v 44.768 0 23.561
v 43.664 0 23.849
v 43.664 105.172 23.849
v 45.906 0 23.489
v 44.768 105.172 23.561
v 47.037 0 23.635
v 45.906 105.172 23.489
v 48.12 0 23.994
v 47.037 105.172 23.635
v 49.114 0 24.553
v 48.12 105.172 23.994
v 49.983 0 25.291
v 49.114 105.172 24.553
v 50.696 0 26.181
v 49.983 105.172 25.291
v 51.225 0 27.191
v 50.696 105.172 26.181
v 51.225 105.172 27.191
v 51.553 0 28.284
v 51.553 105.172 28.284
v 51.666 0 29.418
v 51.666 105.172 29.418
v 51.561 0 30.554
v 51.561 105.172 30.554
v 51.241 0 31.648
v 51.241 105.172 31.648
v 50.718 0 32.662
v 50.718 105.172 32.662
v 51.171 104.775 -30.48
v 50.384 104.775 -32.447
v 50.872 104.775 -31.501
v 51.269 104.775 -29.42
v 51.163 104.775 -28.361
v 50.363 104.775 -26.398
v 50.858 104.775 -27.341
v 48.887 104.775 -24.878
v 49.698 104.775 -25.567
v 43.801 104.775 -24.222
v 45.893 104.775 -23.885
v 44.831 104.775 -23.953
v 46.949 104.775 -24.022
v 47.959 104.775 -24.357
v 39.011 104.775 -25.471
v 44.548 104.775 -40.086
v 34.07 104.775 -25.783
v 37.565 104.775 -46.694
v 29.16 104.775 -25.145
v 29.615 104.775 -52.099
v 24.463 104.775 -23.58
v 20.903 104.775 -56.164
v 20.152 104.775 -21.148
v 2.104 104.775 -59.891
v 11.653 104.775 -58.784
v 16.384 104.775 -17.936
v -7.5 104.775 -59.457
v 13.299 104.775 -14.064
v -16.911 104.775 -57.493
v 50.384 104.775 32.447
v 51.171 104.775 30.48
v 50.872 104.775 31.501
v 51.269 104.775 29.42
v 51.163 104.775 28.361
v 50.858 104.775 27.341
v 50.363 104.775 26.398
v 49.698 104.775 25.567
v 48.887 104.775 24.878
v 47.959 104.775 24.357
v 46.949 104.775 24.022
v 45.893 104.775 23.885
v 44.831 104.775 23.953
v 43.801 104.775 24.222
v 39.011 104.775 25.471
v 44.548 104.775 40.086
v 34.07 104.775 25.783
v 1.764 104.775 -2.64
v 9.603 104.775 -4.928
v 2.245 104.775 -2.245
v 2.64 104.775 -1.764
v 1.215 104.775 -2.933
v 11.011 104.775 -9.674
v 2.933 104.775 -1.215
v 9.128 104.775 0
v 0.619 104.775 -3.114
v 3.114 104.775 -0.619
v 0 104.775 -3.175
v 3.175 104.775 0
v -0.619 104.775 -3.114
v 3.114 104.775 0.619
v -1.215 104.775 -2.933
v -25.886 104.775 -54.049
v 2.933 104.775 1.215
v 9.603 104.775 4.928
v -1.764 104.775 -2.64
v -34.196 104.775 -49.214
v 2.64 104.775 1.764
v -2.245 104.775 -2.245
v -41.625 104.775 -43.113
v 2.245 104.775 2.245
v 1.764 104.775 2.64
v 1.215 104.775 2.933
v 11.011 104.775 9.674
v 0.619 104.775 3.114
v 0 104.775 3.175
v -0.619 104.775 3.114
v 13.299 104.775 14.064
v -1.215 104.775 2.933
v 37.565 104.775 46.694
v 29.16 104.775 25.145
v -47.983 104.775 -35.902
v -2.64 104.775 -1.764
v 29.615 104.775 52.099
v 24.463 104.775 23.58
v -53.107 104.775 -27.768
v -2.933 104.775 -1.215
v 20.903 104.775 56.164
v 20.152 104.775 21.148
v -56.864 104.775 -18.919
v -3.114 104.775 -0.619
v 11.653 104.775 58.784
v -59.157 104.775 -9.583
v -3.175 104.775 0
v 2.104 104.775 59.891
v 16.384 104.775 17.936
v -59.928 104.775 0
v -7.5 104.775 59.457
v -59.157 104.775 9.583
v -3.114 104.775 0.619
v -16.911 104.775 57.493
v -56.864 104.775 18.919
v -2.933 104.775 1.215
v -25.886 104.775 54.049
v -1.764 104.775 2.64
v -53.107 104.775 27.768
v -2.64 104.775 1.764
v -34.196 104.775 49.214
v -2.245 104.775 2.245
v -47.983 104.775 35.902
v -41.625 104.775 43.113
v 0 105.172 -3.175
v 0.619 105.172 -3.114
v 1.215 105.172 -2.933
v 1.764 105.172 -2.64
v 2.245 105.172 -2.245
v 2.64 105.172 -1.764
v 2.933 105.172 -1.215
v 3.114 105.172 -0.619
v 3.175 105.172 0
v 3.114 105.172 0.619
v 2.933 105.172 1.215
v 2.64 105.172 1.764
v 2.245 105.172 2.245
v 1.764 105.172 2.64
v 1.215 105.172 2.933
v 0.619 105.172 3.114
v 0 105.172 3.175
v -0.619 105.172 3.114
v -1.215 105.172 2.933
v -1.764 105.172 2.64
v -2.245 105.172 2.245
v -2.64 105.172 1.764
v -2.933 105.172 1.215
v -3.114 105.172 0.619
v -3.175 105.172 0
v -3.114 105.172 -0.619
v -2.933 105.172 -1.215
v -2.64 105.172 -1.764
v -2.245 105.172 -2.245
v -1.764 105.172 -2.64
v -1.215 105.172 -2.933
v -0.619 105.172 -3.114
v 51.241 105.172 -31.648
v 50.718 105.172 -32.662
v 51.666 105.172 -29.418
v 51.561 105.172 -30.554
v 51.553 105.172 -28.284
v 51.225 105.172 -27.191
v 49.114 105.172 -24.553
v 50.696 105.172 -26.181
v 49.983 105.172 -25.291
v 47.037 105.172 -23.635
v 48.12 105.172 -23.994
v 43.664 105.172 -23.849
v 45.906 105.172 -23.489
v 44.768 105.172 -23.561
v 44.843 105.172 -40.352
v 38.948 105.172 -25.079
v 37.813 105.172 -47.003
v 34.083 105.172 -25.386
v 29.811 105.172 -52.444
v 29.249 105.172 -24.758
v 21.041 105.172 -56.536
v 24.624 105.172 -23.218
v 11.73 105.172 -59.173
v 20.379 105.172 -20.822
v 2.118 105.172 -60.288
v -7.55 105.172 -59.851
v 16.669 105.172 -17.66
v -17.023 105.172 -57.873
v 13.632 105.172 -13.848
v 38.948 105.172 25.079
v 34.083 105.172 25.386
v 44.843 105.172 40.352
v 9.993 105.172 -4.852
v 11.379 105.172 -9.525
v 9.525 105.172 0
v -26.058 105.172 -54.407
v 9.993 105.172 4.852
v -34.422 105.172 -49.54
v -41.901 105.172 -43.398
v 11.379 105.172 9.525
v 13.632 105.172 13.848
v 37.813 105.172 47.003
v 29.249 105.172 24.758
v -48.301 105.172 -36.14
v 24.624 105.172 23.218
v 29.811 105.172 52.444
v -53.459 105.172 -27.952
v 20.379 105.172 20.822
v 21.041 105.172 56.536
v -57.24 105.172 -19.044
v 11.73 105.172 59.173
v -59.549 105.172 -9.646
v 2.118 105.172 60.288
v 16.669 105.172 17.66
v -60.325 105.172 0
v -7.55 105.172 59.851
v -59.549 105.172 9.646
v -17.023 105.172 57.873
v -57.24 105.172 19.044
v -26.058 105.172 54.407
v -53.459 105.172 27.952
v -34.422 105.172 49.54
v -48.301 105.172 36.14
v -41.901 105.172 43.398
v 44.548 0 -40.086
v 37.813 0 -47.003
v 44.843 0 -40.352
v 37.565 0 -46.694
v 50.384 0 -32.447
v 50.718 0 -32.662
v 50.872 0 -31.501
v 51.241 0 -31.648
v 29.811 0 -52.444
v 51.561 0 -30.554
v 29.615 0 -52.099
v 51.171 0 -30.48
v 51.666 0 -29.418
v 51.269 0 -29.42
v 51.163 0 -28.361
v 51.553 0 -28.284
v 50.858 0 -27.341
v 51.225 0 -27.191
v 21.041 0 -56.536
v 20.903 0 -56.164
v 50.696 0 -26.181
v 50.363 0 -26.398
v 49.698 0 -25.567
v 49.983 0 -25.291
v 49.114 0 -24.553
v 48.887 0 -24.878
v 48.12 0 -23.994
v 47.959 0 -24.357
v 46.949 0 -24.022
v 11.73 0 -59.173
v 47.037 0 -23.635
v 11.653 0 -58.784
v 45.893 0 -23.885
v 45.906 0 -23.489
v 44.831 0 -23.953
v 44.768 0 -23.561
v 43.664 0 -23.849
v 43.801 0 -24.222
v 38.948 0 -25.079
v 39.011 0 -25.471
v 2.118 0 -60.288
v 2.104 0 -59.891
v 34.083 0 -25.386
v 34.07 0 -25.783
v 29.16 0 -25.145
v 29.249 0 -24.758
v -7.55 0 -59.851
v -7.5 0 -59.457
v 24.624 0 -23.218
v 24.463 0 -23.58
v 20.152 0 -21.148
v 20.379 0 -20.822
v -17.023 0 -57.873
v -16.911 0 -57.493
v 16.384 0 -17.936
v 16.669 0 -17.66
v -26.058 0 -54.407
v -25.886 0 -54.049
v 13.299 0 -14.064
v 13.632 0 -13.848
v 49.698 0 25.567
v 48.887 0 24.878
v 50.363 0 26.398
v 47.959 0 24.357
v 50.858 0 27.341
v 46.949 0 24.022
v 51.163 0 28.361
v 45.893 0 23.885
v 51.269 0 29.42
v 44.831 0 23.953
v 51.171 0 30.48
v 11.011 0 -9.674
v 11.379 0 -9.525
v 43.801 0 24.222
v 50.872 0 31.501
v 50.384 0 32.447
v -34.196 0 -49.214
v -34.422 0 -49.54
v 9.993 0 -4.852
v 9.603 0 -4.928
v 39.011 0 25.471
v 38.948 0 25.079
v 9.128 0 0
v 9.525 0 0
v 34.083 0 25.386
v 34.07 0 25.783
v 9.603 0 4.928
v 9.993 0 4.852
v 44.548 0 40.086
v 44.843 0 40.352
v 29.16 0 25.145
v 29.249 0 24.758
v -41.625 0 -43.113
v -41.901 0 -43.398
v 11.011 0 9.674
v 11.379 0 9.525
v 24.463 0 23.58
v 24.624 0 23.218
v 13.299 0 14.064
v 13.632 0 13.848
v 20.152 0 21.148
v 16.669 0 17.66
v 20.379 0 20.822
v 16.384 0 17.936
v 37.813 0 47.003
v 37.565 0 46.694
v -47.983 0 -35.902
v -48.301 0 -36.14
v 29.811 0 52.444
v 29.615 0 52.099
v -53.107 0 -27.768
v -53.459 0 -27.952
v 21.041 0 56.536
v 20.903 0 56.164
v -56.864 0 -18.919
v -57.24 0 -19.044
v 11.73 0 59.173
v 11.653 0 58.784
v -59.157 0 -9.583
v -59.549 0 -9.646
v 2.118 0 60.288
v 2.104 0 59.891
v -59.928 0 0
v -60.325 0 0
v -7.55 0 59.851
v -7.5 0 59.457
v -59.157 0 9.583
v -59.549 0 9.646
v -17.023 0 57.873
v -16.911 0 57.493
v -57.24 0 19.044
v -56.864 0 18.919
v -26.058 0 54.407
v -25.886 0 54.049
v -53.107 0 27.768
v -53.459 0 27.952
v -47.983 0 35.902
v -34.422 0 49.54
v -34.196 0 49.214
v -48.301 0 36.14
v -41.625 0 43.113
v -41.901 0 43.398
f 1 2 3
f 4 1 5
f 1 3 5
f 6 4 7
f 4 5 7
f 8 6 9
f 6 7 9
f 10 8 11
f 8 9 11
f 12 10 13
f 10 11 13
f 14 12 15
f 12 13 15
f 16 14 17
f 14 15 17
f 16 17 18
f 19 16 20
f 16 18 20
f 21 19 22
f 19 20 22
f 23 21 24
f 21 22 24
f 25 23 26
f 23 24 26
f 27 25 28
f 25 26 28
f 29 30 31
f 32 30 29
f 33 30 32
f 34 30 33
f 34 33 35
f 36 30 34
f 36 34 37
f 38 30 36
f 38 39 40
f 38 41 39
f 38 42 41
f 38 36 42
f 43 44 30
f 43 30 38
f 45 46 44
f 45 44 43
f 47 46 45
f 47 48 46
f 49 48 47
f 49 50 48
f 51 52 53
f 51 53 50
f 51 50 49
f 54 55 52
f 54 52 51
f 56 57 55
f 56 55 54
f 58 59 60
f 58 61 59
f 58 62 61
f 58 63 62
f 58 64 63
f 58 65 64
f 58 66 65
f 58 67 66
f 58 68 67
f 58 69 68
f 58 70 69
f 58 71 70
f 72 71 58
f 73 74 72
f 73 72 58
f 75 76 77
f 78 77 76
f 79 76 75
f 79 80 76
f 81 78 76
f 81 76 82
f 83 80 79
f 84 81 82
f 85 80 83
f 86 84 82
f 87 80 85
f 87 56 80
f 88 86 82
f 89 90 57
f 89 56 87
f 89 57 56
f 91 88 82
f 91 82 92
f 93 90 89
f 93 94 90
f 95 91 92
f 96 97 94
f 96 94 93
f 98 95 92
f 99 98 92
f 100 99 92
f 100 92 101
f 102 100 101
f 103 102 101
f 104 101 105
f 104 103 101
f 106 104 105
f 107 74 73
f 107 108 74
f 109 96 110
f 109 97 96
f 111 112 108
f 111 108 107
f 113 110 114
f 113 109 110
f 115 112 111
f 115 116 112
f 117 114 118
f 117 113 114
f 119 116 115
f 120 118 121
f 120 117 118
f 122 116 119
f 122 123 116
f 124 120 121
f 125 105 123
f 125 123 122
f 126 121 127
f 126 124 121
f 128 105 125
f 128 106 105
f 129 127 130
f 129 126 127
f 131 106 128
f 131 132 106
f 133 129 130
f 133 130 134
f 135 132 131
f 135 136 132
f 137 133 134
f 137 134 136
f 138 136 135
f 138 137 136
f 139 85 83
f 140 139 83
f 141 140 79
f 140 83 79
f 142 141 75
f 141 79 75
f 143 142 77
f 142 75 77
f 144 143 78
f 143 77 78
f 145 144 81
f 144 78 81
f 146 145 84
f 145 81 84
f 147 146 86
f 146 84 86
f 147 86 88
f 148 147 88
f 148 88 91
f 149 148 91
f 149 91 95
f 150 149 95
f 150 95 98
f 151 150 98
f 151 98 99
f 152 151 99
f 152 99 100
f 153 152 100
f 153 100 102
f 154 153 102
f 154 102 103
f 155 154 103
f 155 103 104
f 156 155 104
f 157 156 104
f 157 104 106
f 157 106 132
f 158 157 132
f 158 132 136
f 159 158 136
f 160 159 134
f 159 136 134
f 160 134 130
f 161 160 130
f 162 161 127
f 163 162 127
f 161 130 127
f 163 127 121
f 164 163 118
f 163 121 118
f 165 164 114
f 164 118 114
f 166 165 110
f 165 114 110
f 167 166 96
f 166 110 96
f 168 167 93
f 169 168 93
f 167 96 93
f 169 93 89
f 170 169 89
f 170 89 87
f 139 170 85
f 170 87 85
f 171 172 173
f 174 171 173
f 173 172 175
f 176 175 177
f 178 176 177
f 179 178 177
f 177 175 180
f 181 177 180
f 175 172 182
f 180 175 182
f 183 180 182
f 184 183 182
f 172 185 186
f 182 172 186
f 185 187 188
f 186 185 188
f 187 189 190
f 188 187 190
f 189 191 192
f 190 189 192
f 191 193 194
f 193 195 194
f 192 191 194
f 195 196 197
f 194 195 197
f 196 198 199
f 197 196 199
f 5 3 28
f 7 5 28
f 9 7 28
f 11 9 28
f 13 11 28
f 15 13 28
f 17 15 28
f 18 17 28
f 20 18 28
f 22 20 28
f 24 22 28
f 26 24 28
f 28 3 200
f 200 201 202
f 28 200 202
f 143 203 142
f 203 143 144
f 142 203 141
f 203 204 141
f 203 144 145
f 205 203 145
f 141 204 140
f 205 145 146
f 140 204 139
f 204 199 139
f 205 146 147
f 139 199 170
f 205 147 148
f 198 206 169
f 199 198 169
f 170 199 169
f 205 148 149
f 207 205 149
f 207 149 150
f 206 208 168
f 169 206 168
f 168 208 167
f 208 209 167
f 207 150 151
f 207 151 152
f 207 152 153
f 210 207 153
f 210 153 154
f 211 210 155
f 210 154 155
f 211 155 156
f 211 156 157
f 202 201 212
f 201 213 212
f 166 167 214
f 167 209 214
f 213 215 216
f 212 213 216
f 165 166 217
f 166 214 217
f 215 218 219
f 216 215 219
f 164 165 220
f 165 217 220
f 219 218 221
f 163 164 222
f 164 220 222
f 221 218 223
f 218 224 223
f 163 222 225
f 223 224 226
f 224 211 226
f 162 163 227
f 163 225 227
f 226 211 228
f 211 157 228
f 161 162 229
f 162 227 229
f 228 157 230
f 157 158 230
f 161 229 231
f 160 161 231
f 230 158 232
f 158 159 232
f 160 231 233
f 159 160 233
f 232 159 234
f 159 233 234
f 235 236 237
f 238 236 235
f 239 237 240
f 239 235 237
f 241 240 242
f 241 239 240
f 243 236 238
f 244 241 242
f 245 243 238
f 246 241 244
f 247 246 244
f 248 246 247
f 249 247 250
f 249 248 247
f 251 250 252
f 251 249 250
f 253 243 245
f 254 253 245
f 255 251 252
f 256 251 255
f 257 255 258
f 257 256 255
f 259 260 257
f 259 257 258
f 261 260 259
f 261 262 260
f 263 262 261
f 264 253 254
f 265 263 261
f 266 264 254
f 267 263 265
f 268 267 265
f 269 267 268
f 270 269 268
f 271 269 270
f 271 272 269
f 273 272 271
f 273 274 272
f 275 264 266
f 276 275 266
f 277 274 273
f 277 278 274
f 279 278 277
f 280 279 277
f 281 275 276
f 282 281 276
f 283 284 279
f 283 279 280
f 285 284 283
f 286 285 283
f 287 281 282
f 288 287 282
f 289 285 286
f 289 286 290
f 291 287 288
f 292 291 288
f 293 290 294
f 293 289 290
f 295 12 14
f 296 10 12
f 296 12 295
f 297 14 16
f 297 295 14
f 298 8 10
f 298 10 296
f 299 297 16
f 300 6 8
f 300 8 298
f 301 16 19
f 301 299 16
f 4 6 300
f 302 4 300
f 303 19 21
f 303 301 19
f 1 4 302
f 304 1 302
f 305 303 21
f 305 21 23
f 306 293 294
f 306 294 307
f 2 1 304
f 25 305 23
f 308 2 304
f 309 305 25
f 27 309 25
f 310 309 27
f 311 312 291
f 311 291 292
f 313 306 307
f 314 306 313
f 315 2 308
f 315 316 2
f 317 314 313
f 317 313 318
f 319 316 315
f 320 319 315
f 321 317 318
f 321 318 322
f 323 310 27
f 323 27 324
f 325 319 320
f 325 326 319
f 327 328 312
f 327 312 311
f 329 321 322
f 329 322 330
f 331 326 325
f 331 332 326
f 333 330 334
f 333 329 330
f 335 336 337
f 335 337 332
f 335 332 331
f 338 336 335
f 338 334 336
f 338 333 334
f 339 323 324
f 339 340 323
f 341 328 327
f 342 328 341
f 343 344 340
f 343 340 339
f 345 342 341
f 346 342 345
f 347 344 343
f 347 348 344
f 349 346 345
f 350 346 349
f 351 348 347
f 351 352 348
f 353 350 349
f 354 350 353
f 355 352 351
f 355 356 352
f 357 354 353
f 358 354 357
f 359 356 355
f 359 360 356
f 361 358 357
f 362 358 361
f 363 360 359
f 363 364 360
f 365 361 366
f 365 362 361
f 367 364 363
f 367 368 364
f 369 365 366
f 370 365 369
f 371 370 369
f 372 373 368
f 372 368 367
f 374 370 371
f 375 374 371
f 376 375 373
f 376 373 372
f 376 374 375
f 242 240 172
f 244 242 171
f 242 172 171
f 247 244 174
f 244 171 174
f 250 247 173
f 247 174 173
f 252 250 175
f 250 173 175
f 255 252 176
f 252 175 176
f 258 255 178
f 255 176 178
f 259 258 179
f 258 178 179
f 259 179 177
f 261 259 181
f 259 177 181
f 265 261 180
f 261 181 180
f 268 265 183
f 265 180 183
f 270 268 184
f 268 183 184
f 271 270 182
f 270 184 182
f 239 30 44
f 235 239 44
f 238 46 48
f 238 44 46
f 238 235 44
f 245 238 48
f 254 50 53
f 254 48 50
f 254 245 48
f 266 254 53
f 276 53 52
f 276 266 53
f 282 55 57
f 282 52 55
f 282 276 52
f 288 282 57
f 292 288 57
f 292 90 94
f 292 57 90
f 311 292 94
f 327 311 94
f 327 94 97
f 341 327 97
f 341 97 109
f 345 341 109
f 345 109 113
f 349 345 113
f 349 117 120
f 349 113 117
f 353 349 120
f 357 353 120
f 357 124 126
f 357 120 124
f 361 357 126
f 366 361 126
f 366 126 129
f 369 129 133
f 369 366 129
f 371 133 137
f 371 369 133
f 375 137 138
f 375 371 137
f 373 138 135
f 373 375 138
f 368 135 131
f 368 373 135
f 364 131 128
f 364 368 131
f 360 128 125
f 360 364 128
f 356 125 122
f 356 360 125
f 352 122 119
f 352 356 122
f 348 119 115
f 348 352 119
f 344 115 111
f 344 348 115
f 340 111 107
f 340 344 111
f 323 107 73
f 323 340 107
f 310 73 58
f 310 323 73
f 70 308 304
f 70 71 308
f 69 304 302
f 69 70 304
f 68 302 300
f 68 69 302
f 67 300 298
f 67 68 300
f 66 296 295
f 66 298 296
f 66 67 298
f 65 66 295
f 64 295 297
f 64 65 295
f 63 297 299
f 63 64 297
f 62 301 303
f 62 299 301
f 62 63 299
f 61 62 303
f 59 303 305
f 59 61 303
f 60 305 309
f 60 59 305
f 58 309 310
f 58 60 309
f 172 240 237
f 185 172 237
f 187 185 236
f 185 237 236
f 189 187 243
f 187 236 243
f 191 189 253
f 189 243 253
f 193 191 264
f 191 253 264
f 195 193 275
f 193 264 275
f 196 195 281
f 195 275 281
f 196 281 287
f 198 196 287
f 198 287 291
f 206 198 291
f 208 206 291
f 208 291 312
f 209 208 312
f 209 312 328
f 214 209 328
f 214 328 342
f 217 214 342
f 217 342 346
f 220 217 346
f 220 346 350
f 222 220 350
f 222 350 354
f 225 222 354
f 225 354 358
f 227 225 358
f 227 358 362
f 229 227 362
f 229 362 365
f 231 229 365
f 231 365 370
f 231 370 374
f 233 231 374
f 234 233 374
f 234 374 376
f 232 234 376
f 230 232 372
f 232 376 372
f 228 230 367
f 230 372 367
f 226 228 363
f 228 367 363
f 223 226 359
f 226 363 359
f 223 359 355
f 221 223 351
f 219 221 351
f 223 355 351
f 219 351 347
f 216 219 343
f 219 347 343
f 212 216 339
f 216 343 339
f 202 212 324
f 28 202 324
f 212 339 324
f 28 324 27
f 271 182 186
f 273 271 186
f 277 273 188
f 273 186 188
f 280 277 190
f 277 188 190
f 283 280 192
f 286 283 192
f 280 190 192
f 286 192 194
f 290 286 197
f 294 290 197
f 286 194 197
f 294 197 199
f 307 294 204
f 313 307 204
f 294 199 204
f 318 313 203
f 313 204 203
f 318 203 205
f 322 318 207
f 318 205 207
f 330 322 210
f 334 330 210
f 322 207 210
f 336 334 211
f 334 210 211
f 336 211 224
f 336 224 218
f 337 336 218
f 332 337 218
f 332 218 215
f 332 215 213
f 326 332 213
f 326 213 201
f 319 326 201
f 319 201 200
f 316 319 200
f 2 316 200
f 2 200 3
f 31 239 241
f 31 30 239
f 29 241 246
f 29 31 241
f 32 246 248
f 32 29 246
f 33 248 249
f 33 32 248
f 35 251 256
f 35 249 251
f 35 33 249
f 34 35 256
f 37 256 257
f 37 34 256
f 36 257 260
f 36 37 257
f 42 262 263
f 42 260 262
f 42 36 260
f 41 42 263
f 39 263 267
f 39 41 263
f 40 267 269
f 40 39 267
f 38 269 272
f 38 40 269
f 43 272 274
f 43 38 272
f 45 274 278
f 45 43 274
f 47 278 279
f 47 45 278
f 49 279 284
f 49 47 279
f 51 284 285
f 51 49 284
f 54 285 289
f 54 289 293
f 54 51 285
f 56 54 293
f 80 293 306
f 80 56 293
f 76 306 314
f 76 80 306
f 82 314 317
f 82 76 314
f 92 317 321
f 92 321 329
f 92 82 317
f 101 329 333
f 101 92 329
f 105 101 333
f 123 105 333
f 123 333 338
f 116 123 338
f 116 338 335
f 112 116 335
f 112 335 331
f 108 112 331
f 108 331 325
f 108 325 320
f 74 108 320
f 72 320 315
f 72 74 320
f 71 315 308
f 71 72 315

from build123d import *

# Parameters (mm, degrees)
CUT_EXTRUDE1_DEPTH = 136.422799192
SHELL1_T           = -0.396875
SKETCH3_R          = 3.175
CUT_EXTRUDE2_DEPTH = 136.114809977


with BuildPart() as part:
    # Sketch1 → Revolve1 (revolve)
    with BuildSketch(Plane.XY, mode=Mode.PRIVATE) as revolve1_sk:
        Polygon((0, 105.171875), (60.325, 105.171875), (60.325, 0), (59.928125, 0), (0, 0), align=None)
    revolve(revolve1_sk.sketch.rotate(Axis((0, 0, 0), (0, 1, 0)), 90), axis=Axis((0, 0, 0), (0, 1, 0)))

    # Sketch2 → Cut-Extrude1 (cut, through all)
    with BuildSketch(Plane(origin=(0, 105.171875, 0), x_dir=(1, 0, 0), z_dir=(0, 1, 0))):
        with BuildLine():
            ThreePointArc((43.664470656, 23.849143646), (9.525, 0), (43.664470656, -23.849143646))
            ThreePointArc((43.664470656, -23.849143646), (50.360604205, -25.718912301), (50.717833444, -32.662011508))
            ThreePointArc((50.717833444, -32.662011508), (60.325, 0), (50.717833444, 32.662011508))
            ThreePointArc((50.717833444, 32.662011508), (50.360604205, 25.718912301), (43.664470656, 23.849143646))
        make_face()
    extrude(amount=-CUT_EXTRUDE1_DEPTH, mode=Mode.SUBTRACT)

    # Shell1
    shell1_openings = [part.faces().sort_by_distance(p)[0] for p in [
        (-8.714175157, 0, 0),
    ]]
    offset(amount=SHELL1_T, openings=shell1_openings, kind=Kind.INTERSECTION)

    # Sketch3 → Cut-Extrude2 (cut, through all)
    with BuildSketch(Plane.XZ.offset(-104.775)):
        with Locations(Location((0, 0, 0), (0, 0, 270))):
            Circle(SKETCH3_R)
    extrude(amount=-CUT_EXTRUDE2_DEPTH, mode=Mode.SUBTRACT)


solid = part.part
